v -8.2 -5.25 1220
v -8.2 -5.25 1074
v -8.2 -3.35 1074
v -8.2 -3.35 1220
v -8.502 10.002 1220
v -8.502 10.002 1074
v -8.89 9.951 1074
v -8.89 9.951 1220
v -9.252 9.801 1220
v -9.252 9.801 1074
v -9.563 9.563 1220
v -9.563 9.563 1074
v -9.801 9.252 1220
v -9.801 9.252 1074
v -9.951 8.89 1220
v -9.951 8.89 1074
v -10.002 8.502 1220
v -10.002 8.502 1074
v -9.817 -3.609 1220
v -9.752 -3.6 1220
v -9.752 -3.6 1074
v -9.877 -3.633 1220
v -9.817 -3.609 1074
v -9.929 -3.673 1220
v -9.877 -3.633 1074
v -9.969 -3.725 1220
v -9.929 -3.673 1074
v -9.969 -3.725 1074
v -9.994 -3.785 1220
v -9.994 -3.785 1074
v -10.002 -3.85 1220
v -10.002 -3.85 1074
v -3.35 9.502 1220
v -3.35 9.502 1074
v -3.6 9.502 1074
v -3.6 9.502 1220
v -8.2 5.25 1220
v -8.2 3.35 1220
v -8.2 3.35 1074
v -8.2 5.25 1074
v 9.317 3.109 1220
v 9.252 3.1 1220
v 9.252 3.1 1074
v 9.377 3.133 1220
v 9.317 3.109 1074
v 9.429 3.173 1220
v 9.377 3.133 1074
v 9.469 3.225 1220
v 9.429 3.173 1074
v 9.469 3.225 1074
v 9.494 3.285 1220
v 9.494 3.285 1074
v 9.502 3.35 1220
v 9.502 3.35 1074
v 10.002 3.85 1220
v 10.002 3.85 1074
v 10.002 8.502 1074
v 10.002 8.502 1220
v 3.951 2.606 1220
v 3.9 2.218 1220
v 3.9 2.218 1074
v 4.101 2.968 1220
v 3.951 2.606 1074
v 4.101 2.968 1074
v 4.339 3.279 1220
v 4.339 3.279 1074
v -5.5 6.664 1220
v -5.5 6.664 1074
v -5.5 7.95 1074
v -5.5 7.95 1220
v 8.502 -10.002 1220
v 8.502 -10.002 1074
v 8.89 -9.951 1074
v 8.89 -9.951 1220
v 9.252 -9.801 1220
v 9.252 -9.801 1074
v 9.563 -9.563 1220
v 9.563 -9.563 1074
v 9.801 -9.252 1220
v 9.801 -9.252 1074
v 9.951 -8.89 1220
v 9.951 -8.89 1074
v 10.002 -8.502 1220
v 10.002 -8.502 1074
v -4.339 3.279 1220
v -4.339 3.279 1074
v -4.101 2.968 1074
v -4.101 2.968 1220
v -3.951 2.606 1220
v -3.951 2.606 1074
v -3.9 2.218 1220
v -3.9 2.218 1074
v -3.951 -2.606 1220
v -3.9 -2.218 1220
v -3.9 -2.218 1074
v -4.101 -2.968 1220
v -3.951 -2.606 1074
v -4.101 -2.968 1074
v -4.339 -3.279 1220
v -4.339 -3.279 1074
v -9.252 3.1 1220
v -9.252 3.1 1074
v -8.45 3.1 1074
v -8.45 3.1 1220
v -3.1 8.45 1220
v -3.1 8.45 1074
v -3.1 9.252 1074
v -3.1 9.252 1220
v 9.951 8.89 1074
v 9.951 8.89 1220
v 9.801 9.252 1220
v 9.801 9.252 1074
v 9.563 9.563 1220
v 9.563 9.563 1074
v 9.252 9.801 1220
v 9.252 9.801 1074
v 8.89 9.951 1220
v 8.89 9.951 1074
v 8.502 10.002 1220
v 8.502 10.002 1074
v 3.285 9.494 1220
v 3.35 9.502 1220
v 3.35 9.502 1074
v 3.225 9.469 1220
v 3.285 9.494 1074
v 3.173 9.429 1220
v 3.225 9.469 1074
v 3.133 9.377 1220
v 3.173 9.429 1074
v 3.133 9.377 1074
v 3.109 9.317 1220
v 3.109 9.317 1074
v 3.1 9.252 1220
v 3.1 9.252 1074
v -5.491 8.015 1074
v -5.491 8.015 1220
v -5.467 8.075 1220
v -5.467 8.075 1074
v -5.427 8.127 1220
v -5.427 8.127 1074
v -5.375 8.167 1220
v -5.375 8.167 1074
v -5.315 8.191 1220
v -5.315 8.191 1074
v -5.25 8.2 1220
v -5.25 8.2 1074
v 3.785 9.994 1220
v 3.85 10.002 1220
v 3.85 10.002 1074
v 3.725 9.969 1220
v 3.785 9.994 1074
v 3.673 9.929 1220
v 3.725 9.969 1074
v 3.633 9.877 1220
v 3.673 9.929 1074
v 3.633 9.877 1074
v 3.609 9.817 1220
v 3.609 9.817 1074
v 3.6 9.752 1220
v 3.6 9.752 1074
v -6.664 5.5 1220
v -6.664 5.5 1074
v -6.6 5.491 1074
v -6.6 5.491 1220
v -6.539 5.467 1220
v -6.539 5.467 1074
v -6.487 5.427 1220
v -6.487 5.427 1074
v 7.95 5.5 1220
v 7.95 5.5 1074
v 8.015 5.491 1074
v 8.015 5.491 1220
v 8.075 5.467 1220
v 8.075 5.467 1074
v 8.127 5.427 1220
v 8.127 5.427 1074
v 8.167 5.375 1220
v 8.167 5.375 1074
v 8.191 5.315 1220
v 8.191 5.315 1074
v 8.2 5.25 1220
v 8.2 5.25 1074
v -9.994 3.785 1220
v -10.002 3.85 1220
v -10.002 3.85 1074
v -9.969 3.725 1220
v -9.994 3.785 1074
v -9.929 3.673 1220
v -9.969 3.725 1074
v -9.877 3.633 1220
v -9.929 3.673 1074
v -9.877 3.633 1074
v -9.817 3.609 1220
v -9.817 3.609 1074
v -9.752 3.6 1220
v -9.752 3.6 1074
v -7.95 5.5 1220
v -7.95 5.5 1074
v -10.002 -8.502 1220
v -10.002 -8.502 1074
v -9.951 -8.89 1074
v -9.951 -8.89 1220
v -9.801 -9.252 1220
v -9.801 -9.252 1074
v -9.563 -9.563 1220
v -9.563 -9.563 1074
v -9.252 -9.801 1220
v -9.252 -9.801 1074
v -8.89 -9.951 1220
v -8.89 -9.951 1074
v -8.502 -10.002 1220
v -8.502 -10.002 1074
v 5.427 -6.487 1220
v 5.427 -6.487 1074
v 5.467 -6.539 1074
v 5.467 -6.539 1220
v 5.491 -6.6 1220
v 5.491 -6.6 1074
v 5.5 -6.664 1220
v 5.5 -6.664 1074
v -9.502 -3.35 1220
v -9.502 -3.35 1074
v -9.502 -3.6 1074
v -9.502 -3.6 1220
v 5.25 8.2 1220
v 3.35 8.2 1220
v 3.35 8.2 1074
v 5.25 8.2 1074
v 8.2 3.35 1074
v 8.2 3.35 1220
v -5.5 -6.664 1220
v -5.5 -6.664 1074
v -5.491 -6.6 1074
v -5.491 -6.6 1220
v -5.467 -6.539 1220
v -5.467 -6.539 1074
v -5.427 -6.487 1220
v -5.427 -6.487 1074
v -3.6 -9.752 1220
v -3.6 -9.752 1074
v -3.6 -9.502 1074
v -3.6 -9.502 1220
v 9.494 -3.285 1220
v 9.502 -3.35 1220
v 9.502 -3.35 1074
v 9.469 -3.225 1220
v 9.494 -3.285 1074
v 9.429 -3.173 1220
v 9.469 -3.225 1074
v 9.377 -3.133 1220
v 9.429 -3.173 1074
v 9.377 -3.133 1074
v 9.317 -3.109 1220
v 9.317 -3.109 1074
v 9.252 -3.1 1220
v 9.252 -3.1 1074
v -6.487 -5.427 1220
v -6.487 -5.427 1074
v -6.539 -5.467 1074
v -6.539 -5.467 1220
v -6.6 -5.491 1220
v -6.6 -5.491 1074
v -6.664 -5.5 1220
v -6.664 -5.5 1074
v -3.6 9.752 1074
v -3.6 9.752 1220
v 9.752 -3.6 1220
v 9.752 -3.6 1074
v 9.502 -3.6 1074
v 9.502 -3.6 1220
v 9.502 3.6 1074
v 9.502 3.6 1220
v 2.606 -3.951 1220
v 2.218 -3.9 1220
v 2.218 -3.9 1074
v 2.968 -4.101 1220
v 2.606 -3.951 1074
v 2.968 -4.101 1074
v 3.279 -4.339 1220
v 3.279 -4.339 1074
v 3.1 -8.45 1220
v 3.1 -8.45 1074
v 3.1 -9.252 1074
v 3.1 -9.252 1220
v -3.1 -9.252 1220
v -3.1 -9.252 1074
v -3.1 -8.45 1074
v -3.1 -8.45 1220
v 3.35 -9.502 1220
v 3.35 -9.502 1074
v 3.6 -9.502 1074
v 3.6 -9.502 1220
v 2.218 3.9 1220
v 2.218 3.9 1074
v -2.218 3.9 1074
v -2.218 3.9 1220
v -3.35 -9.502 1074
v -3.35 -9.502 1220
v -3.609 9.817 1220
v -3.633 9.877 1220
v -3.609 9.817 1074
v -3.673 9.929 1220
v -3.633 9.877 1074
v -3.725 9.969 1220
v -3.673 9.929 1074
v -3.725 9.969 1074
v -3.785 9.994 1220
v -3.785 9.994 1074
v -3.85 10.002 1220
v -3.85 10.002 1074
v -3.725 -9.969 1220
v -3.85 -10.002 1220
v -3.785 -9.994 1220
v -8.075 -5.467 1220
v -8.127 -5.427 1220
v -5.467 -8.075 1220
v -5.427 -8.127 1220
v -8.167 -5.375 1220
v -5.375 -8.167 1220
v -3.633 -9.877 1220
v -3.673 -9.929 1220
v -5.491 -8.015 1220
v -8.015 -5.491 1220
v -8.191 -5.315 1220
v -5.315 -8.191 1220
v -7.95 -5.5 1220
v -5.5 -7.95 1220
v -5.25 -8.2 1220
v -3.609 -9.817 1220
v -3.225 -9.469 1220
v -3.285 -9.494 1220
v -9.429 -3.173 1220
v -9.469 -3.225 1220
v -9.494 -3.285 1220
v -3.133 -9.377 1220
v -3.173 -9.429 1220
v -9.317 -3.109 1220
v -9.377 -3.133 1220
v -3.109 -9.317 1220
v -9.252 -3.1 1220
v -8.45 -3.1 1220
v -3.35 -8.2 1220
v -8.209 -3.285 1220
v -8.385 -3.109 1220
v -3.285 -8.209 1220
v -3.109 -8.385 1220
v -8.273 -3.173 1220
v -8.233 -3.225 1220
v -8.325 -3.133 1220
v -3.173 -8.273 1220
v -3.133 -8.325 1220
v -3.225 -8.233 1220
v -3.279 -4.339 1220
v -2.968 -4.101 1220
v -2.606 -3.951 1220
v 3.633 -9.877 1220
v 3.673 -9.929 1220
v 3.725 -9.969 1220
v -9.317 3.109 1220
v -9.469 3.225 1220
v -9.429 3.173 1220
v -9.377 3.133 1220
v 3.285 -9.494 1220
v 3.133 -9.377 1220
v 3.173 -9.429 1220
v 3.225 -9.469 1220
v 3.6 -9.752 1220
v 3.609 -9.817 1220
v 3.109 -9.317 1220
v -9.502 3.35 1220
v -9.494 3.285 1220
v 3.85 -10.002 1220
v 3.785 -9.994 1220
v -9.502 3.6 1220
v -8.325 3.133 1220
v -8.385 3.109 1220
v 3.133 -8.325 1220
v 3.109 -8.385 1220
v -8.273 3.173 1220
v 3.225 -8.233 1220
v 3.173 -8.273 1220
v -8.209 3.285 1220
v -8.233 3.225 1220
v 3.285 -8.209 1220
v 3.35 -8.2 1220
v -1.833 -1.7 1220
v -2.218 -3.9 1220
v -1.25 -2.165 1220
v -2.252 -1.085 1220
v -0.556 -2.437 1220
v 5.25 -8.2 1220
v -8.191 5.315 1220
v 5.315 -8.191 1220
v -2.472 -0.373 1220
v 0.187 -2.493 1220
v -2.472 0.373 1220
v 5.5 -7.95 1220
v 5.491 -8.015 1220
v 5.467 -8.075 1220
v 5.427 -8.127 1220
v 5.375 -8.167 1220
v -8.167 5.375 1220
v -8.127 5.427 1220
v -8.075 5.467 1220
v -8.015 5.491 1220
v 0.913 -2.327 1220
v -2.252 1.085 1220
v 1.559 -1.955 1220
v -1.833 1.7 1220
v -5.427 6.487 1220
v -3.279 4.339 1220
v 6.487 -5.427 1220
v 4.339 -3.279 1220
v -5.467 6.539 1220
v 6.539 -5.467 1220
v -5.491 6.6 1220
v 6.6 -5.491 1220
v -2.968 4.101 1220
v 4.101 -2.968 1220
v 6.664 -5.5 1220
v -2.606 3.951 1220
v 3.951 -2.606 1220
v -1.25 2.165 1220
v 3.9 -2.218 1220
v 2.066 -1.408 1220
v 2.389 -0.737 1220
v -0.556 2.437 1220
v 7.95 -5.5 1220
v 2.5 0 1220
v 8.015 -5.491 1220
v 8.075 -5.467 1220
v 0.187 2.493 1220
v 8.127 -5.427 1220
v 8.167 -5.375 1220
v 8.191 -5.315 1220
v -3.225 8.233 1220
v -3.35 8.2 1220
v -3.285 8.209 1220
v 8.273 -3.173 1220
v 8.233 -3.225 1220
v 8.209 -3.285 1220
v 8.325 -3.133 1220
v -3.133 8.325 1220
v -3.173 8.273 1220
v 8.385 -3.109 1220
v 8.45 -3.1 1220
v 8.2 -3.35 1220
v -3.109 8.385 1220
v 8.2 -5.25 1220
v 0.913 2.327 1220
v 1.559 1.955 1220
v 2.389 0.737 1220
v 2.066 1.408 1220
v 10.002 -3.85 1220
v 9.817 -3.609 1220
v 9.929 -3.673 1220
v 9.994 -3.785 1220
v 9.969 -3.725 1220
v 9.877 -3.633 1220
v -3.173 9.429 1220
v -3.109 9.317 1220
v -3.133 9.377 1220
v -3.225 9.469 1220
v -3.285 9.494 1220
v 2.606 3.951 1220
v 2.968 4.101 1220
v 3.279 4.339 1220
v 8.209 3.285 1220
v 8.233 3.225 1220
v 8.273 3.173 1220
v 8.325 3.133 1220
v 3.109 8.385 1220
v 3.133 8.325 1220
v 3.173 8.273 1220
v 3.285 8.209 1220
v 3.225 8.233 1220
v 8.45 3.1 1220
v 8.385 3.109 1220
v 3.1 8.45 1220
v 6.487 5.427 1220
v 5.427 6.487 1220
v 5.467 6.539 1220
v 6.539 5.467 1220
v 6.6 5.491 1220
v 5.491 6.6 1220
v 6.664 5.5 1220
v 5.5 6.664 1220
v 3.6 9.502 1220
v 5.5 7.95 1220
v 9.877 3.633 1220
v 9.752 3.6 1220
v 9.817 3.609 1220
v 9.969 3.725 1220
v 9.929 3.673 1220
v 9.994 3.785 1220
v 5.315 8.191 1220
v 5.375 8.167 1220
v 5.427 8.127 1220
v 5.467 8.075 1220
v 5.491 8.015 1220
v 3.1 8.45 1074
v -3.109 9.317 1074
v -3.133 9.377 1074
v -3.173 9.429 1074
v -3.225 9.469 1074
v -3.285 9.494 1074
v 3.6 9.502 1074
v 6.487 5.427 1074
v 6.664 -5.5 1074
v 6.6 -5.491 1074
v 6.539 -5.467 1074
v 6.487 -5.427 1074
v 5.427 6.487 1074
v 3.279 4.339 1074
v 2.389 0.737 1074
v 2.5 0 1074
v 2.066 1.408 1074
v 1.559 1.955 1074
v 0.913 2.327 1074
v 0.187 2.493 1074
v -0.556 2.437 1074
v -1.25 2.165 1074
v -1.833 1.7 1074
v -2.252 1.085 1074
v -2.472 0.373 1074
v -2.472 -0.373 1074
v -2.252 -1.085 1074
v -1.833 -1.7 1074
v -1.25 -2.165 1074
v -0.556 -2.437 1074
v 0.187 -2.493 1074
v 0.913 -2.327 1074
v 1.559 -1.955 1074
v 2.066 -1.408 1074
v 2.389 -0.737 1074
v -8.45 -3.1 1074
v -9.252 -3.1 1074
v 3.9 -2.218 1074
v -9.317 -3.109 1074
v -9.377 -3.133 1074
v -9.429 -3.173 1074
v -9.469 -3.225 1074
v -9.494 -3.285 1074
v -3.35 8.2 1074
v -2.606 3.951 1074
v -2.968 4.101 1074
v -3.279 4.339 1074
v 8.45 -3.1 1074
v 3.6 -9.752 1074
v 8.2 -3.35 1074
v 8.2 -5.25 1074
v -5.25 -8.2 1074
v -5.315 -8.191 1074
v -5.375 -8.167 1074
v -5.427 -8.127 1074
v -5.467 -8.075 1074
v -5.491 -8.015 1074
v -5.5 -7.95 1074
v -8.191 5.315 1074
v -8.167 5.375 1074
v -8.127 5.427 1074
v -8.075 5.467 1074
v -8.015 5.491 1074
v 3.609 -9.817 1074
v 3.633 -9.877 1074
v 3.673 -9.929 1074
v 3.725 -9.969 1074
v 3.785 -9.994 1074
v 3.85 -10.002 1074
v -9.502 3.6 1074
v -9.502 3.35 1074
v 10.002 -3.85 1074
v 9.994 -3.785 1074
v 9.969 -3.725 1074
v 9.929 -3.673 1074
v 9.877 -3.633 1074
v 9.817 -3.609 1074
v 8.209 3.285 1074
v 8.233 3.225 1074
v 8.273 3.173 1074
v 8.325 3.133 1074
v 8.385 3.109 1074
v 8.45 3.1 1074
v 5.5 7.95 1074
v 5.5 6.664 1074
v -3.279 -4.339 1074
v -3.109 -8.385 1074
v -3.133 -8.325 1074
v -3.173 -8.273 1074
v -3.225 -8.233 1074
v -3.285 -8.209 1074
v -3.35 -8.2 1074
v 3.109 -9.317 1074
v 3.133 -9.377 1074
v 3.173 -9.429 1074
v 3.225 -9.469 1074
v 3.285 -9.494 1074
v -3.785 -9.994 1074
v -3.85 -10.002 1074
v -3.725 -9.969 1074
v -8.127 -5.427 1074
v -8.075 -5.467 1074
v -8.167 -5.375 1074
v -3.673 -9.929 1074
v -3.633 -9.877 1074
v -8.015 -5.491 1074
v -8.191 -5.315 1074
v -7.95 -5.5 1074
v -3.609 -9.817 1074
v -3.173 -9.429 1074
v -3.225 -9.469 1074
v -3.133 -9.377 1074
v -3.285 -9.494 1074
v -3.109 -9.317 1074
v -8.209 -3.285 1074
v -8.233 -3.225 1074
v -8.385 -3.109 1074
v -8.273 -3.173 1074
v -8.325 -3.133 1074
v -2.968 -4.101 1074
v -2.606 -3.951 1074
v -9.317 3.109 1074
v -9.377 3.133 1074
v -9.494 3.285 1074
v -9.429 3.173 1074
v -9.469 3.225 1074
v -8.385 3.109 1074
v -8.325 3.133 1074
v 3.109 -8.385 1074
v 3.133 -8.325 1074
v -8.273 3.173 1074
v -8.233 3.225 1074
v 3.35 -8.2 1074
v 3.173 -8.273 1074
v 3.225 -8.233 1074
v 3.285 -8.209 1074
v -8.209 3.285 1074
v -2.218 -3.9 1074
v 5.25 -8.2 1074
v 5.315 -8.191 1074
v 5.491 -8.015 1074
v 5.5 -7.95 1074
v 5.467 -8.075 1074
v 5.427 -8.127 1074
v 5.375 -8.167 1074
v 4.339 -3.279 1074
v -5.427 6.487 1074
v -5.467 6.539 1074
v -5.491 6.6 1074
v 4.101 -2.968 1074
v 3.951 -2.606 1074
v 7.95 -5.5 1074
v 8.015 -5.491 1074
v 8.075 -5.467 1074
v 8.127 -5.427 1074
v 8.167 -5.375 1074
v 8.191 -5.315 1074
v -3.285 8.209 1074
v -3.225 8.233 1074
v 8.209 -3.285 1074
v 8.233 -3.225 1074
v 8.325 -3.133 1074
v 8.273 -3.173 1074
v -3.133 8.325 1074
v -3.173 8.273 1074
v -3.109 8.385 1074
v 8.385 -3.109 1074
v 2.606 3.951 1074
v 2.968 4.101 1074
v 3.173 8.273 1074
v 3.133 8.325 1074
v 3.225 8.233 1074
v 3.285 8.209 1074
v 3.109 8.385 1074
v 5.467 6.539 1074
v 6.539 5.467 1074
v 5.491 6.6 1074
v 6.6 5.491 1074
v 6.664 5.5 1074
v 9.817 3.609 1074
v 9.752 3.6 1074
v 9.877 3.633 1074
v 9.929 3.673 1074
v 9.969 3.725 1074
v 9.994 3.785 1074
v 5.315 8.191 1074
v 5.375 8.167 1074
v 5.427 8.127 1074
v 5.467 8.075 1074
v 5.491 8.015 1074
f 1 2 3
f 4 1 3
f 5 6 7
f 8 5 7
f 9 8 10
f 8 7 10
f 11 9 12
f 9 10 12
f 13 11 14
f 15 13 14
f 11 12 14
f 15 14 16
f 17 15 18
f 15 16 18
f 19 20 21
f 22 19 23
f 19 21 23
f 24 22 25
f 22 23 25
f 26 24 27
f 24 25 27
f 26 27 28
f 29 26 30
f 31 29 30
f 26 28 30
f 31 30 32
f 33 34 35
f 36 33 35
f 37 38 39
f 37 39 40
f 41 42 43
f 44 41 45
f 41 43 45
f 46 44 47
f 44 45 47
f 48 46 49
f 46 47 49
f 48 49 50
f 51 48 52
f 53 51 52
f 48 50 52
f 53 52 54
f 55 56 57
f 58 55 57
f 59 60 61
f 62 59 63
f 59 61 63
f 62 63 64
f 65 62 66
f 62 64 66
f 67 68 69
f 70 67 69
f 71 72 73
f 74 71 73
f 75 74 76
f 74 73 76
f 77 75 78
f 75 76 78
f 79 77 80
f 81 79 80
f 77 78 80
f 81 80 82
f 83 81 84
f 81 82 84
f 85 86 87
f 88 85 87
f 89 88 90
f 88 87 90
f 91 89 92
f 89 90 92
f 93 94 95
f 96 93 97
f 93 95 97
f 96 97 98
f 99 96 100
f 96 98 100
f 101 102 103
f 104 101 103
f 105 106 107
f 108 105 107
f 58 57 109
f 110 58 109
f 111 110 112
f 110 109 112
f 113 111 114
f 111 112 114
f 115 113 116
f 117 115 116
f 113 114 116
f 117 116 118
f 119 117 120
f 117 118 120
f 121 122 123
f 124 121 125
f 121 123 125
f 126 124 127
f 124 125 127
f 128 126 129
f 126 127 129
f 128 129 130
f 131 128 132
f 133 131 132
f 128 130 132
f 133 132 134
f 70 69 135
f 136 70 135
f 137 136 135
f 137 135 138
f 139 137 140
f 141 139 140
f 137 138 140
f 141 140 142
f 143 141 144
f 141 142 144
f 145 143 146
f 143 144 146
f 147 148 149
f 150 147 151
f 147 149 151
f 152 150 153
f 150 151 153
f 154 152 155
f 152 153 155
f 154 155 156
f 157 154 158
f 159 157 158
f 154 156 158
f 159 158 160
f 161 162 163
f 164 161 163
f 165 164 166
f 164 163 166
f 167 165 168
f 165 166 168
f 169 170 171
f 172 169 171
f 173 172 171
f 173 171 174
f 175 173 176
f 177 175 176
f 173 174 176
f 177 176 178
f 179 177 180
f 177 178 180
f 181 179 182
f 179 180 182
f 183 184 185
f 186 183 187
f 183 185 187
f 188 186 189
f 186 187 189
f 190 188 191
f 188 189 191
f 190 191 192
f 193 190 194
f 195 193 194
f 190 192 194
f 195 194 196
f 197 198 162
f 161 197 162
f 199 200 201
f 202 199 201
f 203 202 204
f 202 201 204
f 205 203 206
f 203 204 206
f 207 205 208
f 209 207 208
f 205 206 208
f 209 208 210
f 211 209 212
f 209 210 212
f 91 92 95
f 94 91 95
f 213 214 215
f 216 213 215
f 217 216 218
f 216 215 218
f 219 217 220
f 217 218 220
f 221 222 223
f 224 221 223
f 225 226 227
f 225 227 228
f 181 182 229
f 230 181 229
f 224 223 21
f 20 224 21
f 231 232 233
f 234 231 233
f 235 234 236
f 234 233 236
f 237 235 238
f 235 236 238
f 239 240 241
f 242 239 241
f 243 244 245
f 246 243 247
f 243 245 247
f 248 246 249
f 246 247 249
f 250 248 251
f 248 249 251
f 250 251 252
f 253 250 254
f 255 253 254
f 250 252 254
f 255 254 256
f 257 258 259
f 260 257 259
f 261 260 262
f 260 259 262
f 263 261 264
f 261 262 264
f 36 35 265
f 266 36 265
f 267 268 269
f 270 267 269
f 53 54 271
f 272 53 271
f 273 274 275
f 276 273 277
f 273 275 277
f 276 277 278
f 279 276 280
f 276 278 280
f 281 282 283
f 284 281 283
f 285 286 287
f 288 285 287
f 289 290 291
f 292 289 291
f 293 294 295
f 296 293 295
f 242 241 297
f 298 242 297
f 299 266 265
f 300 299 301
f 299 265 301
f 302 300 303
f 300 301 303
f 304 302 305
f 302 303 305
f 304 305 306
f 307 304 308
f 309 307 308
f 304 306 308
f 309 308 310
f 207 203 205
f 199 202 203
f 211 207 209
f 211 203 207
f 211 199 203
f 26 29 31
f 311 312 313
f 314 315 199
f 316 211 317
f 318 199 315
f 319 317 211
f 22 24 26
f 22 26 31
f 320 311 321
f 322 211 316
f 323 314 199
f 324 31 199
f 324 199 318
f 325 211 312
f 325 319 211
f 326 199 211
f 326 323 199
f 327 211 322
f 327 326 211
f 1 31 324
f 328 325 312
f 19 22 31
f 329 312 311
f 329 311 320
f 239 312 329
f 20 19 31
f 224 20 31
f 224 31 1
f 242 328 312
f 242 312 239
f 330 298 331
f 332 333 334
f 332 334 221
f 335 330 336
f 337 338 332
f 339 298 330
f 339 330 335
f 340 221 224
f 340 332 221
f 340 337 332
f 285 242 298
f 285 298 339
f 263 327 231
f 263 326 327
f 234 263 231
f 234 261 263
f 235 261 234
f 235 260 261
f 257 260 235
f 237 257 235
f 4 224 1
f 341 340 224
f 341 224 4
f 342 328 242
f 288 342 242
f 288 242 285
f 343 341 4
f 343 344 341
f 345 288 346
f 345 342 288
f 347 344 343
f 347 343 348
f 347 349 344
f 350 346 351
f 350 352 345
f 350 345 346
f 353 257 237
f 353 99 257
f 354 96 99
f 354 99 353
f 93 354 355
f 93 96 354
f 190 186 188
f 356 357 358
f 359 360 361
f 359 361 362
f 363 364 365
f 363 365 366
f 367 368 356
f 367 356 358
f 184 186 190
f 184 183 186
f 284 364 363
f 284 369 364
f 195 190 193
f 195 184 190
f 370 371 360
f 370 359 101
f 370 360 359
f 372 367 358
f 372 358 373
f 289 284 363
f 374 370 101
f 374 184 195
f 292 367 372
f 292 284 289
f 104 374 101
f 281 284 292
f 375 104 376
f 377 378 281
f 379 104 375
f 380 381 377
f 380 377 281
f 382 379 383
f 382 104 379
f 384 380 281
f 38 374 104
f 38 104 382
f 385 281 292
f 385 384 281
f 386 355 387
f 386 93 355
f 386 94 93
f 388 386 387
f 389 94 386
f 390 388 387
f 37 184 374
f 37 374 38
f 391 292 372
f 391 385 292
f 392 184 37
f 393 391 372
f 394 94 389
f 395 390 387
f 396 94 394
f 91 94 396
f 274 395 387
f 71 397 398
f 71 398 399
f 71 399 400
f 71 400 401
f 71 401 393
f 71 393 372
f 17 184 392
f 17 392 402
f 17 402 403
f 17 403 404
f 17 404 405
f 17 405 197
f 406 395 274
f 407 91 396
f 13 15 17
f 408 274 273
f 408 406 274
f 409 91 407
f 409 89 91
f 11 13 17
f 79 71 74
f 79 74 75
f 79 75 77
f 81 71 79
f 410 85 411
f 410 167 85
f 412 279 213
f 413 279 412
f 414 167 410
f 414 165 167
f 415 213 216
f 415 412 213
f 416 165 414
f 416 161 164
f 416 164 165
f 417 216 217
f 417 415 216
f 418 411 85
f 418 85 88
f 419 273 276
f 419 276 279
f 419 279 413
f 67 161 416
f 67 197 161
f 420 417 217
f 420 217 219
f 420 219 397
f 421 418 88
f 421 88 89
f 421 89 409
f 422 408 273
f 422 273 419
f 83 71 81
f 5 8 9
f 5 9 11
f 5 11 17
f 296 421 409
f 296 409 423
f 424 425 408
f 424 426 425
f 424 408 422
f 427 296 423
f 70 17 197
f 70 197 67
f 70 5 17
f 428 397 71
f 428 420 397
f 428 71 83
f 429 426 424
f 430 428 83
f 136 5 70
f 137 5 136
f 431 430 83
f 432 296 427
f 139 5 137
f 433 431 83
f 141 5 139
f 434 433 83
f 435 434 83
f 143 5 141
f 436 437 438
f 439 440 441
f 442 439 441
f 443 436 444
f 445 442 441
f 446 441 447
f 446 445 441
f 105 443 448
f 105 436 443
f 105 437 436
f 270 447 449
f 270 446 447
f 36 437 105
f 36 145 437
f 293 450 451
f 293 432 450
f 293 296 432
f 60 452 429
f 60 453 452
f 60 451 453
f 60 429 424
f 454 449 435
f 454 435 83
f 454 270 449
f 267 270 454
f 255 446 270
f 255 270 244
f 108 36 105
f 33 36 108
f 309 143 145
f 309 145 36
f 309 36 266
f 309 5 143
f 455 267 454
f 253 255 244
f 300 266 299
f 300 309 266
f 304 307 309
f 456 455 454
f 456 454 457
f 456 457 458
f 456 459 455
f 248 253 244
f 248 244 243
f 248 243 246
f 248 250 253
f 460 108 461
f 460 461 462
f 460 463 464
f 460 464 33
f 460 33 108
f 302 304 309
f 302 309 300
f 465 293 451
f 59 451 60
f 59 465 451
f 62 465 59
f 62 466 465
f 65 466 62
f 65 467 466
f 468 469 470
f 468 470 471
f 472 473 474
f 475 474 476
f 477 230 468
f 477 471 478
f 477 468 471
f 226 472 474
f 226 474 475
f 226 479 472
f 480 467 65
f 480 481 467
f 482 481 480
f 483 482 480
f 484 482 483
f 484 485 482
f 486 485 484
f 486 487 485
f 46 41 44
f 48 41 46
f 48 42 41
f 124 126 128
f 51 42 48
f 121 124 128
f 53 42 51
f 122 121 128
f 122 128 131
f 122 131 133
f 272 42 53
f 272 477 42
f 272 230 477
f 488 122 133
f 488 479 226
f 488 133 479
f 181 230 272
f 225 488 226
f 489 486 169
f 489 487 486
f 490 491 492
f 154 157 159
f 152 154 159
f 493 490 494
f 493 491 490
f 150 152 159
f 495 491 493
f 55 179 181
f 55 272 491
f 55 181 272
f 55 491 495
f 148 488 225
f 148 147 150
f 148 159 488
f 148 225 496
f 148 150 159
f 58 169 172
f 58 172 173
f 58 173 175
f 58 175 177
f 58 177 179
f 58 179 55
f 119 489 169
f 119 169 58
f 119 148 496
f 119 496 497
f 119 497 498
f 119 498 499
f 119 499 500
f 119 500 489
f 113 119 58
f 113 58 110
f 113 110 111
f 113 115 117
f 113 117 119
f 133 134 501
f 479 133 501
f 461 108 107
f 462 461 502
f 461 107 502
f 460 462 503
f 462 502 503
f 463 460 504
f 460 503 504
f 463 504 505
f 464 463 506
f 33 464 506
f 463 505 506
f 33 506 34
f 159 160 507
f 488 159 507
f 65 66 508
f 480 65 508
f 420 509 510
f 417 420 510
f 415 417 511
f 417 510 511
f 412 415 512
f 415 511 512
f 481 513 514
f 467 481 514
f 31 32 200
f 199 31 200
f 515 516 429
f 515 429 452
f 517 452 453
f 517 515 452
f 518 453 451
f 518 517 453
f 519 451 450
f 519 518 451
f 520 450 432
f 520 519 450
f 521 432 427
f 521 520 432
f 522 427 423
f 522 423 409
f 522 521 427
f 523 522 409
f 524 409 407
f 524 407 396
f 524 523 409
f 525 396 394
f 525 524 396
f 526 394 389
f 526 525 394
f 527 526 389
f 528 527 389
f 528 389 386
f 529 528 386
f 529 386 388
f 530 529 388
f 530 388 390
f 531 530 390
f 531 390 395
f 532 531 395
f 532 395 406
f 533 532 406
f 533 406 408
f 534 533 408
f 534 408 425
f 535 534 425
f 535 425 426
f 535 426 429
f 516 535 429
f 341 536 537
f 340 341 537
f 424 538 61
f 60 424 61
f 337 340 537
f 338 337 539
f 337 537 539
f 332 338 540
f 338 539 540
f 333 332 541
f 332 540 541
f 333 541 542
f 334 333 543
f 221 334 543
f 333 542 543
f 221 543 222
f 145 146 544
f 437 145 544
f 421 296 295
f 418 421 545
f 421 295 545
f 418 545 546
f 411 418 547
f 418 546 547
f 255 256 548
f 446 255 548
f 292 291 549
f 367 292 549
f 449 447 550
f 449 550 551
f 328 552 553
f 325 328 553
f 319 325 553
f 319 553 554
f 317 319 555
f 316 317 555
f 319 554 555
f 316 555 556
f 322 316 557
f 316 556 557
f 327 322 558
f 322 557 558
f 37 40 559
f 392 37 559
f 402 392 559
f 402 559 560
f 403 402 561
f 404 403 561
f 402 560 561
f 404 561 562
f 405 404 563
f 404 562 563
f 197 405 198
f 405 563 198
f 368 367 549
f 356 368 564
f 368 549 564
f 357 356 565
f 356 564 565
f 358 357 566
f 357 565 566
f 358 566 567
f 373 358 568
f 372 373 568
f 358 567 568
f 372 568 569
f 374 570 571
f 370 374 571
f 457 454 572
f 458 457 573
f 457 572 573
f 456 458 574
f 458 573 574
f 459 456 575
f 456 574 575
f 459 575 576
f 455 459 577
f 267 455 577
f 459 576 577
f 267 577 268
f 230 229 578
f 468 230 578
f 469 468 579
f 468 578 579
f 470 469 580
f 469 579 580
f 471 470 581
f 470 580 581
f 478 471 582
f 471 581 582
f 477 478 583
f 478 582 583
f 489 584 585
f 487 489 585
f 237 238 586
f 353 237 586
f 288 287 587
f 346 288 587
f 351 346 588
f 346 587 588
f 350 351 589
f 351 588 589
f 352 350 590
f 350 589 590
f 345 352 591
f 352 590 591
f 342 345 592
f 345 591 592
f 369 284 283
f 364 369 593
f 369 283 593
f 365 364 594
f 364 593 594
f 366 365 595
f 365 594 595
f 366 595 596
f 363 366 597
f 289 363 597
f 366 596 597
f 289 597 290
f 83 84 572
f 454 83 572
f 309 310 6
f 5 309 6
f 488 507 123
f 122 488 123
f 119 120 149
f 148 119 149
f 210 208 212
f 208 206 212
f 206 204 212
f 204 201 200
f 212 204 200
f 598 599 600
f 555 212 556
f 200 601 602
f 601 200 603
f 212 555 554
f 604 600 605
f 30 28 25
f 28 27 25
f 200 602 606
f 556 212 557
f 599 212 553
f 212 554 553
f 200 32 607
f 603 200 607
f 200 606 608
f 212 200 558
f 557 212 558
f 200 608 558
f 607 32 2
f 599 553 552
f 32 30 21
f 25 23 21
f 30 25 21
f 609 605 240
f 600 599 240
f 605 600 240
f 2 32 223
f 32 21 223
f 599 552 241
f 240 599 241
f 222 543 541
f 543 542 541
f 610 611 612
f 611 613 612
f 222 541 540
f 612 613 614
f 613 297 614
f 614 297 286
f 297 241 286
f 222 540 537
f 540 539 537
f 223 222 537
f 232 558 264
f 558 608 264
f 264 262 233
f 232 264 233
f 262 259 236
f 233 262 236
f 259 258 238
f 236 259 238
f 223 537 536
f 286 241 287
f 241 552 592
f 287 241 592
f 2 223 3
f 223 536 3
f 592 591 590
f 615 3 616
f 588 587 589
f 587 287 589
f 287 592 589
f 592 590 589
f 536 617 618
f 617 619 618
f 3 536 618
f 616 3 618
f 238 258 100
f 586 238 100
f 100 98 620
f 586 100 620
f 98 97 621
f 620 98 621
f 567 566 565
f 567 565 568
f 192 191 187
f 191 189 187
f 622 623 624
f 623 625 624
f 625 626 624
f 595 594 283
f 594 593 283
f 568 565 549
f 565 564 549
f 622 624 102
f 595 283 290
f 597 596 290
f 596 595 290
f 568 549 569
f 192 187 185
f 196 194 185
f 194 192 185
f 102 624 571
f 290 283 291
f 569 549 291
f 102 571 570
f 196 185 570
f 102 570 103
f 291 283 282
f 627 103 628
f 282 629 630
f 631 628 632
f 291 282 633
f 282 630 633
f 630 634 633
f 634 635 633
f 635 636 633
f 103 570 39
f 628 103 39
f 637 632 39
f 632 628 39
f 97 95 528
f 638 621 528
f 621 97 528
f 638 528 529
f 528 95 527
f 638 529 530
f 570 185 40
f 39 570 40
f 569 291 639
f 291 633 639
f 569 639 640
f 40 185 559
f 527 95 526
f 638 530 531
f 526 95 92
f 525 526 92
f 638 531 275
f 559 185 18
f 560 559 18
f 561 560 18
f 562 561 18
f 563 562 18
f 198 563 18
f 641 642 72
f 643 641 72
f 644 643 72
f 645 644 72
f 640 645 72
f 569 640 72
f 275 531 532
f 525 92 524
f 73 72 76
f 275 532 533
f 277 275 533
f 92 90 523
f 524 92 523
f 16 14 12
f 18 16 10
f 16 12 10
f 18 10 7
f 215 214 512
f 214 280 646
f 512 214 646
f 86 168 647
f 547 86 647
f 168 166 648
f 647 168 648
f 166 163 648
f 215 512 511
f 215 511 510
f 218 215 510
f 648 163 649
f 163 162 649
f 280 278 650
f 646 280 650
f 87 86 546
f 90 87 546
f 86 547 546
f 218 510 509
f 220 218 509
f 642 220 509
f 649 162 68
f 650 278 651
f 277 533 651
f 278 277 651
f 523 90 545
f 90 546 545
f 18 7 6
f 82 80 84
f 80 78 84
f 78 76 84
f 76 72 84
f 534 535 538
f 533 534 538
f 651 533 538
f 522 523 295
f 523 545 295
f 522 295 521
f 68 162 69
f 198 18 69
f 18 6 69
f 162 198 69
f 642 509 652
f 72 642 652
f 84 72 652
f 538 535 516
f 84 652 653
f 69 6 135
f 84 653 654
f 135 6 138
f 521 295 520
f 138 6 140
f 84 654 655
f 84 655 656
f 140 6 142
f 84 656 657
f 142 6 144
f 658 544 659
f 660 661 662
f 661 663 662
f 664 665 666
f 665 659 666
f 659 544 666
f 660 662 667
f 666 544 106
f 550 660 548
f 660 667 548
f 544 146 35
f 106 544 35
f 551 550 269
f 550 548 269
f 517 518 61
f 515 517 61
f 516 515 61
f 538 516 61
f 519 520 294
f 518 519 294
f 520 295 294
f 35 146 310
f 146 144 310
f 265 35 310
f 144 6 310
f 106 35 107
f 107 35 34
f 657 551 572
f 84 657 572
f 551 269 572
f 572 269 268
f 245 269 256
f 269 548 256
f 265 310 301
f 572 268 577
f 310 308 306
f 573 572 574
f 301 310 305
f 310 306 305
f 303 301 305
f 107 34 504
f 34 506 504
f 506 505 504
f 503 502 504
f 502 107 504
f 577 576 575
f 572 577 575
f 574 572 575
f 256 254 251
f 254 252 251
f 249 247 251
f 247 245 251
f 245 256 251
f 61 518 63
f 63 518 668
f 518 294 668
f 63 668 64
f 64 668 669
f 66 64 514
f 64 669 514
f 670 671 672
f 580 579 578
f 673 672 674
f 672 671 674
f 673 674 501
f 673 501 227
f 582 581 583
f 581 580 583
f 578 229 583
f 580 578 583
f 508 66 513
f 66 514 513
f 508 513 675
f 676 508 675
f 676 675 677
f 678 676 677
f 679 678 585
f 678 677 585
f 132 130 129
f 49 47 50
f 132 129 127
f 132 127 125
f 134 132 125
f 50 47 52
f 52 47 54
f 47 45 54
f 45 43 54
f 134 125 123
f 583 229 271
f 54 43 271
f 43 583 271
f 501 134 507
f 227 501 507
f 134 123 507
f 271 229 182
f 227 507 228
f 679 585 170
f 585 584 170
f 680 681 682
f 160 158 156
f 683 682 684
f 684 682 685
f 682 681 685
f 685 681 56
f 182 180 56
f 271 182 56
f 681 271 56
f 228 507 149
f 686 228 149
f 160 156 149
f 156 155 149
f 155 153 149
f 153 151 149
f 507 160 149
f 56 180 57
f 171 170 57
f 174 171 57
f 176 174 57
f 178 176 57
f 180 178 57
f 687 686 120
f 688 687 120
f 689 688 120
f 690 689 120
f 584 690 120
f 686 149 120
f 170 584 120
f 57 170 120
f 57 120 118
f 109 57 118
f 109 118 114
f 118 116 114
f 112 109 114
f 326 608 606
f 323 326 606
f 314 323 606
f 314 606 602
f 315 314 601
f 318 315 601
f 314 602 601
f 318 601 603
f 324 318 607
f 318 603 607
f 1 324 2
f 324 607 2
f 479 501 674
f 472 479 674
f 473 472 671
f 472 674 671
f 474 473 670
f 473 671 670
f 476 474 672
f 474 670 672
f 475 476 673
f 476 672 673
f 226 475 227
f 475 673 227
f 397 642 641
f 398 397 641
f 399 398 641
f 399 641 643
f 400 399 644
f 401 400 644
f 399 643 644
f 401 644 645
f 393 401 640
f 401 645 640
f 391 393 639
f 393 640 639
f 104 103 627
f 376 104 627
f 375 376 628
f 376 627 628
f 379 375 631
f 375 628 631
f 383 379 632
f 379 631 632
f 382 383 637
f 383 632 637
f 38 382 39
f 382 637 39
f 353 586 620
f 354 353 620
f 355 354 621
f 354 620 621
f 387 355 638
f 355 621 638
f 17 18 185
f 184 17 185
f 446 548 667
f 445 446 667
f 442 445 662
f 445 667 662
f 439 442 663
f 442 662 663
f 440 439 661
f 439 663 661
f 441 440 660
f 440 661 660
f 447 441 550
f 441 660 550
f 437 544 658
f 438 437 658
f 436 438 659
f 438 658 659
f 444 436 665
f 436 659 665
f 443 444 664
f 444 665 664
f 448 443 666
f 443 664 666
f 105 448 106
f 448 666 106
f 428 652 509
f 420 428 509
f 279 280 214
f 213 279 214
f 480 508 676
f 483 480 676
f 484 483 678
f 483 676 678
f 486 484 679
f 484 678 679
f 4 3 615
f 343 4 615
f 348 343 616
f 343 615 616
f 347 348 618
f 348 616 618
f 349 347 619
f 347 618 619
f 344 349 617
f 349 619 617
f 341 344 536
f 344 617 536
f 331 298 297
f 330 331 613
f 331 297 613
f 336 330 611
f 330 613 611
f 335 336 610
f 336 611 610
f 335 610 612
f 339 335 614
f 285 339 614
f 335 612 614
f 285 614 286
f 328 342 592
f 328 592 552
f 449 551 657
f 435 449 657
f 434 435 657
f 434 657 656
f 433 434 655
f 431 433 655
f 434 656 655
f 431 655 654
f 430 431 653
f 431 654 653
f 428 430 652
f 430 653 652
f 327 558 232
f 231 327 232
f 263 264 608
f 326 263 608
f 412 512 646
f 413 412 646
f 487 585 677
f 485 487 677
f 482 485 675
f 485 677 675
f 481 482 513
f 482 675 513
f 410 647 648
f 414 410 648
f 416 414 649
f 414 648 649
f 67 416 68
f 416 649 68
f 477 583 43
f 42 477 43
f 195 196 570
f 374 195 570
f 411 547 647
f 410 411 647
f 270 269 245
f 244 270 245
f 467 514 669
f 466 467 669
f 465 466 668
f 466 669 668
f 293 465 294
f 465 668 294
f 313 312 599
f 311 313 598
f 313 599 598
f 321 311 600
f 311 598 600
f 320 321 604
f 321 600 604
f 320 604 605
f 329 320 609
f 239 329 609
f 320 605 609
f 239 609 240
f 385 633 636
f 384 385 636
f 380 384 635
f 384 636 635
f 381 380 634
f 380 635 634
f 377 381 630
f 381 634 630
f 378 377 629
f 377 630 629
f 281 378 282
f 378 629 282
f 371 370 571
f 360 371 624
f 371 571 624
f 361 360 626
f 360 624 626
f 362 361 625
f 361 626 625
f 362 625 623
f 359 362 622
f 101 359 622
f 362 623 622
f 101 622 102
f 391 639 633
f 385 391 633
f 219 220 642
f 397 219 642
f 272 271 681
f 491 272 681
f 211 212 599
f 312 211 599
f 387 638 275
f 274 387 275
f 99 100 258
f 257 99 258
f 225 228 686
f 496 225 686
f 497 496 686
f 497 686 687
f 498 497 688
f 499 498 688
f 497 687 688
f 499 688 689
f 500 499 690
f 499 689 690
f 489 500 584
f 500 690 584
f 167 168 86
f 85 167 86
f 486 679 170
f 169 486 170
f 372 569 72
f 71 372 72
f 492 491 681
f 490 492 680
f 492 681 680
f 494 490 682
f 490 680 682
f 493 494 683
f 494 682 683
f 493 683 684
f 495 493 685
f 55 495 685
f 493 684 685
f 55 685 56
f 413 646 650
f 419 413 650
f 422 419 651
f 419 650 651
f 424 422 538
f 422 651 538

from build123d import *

# Parameters (mm, degrees)
SKETCH_1_R         = 2.5
EXTRUDE_1_DEPTH    = 1220
SKETCH1_R          = 16.771487081
CUT_EXTRUDE1_DEPTH = 1075


with BuildPart() as part:
    # 草图1 → 凸台-拉伸1 (new body)
    with BuildSketch(Plane.XY):
        with BuildLine():
            Line((-8.502261885, -10.002261885), (-3.85, -10.002261885))
            ThreePointArc((-3.85, -10.002261885), (-3.673223305, -9.929038581), (-3.6, -9.752261885))
            Line((-3.6, -9.752261885), (-3.6, -9.502261885))
            Line((-3.6, -9.502261885), (-3.35, -9.502261885))
            ThreePointArc((-3.35, -9.502261885), (-3.173223305, -9.429038581), (-3.1, -9.252261885))
            Line((-3.1, -9.252261885), (-3.1, -8.45))
            ThreePointArc((-3.1, -8.45), (-3.173223305, -8.273223305), (-3.35, -8.2))
            Line((-3.35, -8.2), (-5.25, -8.2))
            ThreePointArc((-5.25, -8.2), (-5.426776695, -8.126776695), (-5.5, -7.95))
            Line((-5.5, -7.95), (-5.5, -6.664213562))
            ThreePointArc((-5.5, -6.664213562), (-5.480969883, -6.568542704), (-5.426776695, -6.487436867))
            Line((-5.426776695, -6.487436867), (-3.278679656, -4.339339828))
            ThreePointArc((-3.278679656, -4.339339828), (-2.792044633, -4.014180701), (-2.218019485, -3.9))
            Line((-2.218019485, -3.9), (2.218019485, -3.9))
            ThreePointArc((2.218019485, -3.9), (2.792044633, -4.014180701), (3.278679656, -4.339339828))
            Line((3.278679656, -4.339339828), (5.426776695, -6.487436867))
            ThreePointArc((5.426776695, -6.487436867), (5.480969883, -6.568542704), (5.5, -6.664213562))
            Line((5.5, -6.664213562), (5.5, -7.95))
            ThreePointArc((5.5, -7.95), (5.426776695, -8.126776695), (5.25, -8.2))
            Line((5.25, -8.2), (3.35, -8.2))
            ThreePointArc((3.35, -8.2), (3.173223305, -8.273223305), (3.1, -8.45))
            Line((3.1, -8.45), (3.1, -9.252261885))
            ThreePointArc((3.1, -9.252261885), (3.173223305, -9.429038581), (3.35, -9.502261885))
            Line((3.35, -9.502261885), (3.6, -9.502261885))
            Line((3.6, -9.502261885), (3.6, -9.752261885))
            ThreePointArc((3.6, -9.752261885), (3.673223305, -9.929038581), (3.85, -10.002261885))
            Line((3.85, -10.002261885), (8.502261885, -10.002261885))
            ThreePointArc((8.502261885, -10.002261885), (9.562922057, -9.562922057), (10.002261885, -8.502261885))
            Line((10.002261885, -8.502261885), (10.002261885, -3.85))
            ThreePointArc((10.002261885, -3.85), (9.929038581, -3.673223305), (9.752261885, -3.6))
            Line((9.752261885, -3.6), (9.502261885, -3.6))
            Line((9.502261885, -3.6), (9.502261885, -3.35))
            ThreePointArc((9.502261885, -3.35), (9.429038581, -3.173223305), (9.252261885, -3.1))
            Line((9.252261885, -3.1), (8.45, -3.1))
            ThreePointArc((8.45, -3.1), (8.273223305, -3.173223305), (8.2, -3.35))
            Line((8.2, -3.35), (8.2, -5.25))
            ThreePointArc((8.2, -5.25), (8.126776695, -5.426776695), (7.95, -5.5))
            Line((7.95, -5.5), (6.664213562, -5.5))
            ThreePointArc((6.664213562, -5.5), (6.568542704, -5.480969883), (6.487436867, -5.426776695))
            Line((6.487436867, -5.426776695), (4.339339828, -3.278679656))
            ThreePointArc((4.339339828, -3.278679656), (4.014180701, -2.792044633), (3.9, -2.218019485))
            Line((3.9, -2.218019485), (3.9, 2.218019485))
            ThreePointArc((3.9, 2.218019485), (4.014180701, 2.792044633), (4.339339828, 3.278679656))
            Line((4.339339828, 3.278679656), (6.487436867, 5.426776695))
            ThreePointArc((6.487436867, 5.426776695), (6.568542704, 5.480969883), (6.664213562, 5.5))
            Line((6.664213562, 5.5), (7.95, 5.5))
            ThreePointArc((7.95, 5.5), (8.126776695, 5.426776695), (8.2, 5.25))
            Line((8.2, 5.25), (8.2, 3.35))
            ThreePointArc((8.2, 3.35), (8.273223305, 3.173223305), (8.45, 3.1))
            Line((8.45, 3.1), (9.252261885, 3.1))
            ThreePointArc((9.252261885, 3.1), (9.429038581, 3.173223305), (9.502261885, 3.35))
            Line((9.502261885, 3.35), (9.502261885, 3.6))
            Line((9.502261885, 3.6), (9.752261885, 3.6))
            ThreePointArc((9.752261885, 3.6), (9.929038581, 3.673223305), (10.002261885, 3.85))
            Line((10.002261885, 3.85), (10.002261885, 8.502261885))
            ThreePointArc((10.002261885, 8.502261885), (9.562922057, 9.562922057), (8.502261885, 10.002261885))
            Line((8.502261885, 10.002261885), (3.85, 10.002261885))
            ThreePointArc((3.85, 10.002261885), (3.673223305, 9.929038581), (3.6, 9.752261885))
            Line((3.6, 9.752261885), (3.6, 9.502261885))
            Line((3.6, 9.502261885), (3.35, 9.502261885))
            ThreePointArc((3.35, 9.502261885), (3.173223305, 9.429038581), (3.1, 9.252261885))
            Line((3.1, 9.252261885), (3.1, 8.45))
            ThreePointArc((3.1, 8.45), (3.173223305, 8.273223305), (3.35, 8.2))
            Line((3.35, 8.2), (5.25, 8.2))
            ThreePointArc((5.25, 8.2), (5.426776695, 8.126776695), (5.5, 7.95))
            Line((5.5, 7.95), (5.5, 6.664213562))
            ThreePointArc((5.5, 6.664213562), (5.480969883, 6.568542704), (5.426776695, 6.487436867))
            Line((5.426776695, 6.487436867), (3.278679656, 4.339339828))
            ThreePointArc((3.278679656, 4.339339828), (2.792044633, 4.014180701), (2.218019485, 3.9))
            Line((2.218019485, 3.9), (-2.218019485, 3.9))
            ThreePointArc((-2.218019485, 3.9), (-2.792044633, 4.014180701), (-3.278679656, 4.339339828))
            Line((-3.278679656, 4.339339828), (-5.426776695, 6.487436867))
            ThreePointArc((-5.426776695, 6.487436867), (-5.480969883, 6.568542704), (-5.5, 6.664213562))
            Line((-5.5, 6.664213562), (-5.5, 7.95))
            ThreePointArc((-5.5, 7.95), (-5.426776695, 8.126776695), (-5.25, 8.2))
            Line((-5.25, 8.2), (-3.35, 8.2))
            ThreePointArc((-3.35, 8.2), (-3.173223305, 8.273223305), (-3.1, 8.45))
            Line((-3.1, 8.45), (-3.1, 9.252261885))
            ThreePointArc((-3.1, 9.252261885), (-3.173223305, 9.429038581), (-3.35, 9.502261885))
            Line((-3.35, 9.502261885), (-3.6, 9.502261885))
            Line((-3.6, 9.502261885), (-3.6, 9.752261885))
            ThreePointArc((-3.6, 9.752261885), (-3.673223305, 9.929038581), (-3.85, 10.002261885))
            Line((-3.85, 10.002261885), (-8.502261885, 10.002261885))
            ThreePointArc((-8.502261885, 10.002261885), (-9.562922057, 9.562922057), (-10.002261885, 8.502261885))
            Line((-10.002261885, 8.502261885), (-10.002261885, 3.85))
            ThreePointArc((-10.002261885, 3.85), (-9.929038581, 3.673223305), (-9.752261885, 3.6))
            Line((-9.752261885, 3.6), (-9.502261885, 3.6))
            Line((-9.502261885, 3.6), (-9.502261885, 3.35))
            ThreePointArc((-9.502261885, 3.35), (-9.429038581, 3.173223305), (-9.252261885, 3.1))
            Line((-9.252261885, 3.1), (-8.45, 3.1))
            ThreePointArc((-8.45, 3.1), (-8.273223305, 3.173223305), (-8.2, 3.35))
            Line((-8.2, 3.35), (-8.2, 5.25))
            ThreePointArc((-8.2, 5.25), (-8.126776695, 5.426776695), (-7.95, 5.5))
            Line((-7.95, 5.5), (-6.664213562, 5.5))
            ThreePointArc((-6.664213562, 5.5), (-6.568542704, 5.480969883), (-6.487436867, 5.426776695))
            Line((-6.487436867, 5.426776695), (-4.339339828, 3.278679656))
            ThreePointArc((-4.339339828, 3.278679656), (-4.014180701, 2.792044633), (-3.9, 2.218019485))
            Line((-3.9, 2.218019485), (-3.9, -2.218019485))
            ThreePointArc((-3.9, -2.218019485), (-4.014180701, -2.792044633), (-4.339339828, -3.278679656))
            Line((-4.339339828, -3.278679656), (-6.487436867, -5.426776695))
            ThreePointArc((-6.487436867, -5.426776695), (-6.568542704, -5.480969883), (-6.664213562, -5.5))
            Line((-6.664213562, -5.5), (-7.95, -5.5))
            ThreePointArc((-7.95, -5.5), (-8.126776695, -5.426776695), (-8.2, -5.25))
            Line((-8.2, -5.25), (-8.2, -3.35))
            ThreePointArc((-8.2, -3.35), (-8.273223305, -3.173223305), (-8.45, -3.1))
            Line((-8.45, -3.1), (-9.252261885, -3.1))
            ThreePointArc((-9.252261885, -3.1), (-9.429038581, -3.173223305), (-9.502261885, -3.35))
            Line((-9.502261885, -3.35), (-9.502261885, -3.6))
            Line((-9.502261885, -3.6), (-9.752261885, -3.6))
            ThreePointArc((-9.752261885, -3.6), (-9.929038581, -3.673223305), (-10.002261885, -3.85))
            Line((-10.002261885, -3.85), (-10.002261885, -8.502261885))
            ThreePointArc((-10.002261885, -8.502261885), (-9.562922057, -9.562922057), (-8.502261885, -10.002261885))
        make_face()
        Circle(SKETCH_1_R, mode=Mode.SUBTRACT)
    extrude(amount=EXTRUDE_1_DEPTH)

    # Sketch1 → Cut-Extrude1 (cut, through all)
    with BuildSketch(Plane.XY.offset(1074)):
        Circle(SKETCH1_R)
    extrude(amount=-CUT_EXTRUDE1_DEPTH, mode=Mode.SUBTRACT)


solid = part.part
